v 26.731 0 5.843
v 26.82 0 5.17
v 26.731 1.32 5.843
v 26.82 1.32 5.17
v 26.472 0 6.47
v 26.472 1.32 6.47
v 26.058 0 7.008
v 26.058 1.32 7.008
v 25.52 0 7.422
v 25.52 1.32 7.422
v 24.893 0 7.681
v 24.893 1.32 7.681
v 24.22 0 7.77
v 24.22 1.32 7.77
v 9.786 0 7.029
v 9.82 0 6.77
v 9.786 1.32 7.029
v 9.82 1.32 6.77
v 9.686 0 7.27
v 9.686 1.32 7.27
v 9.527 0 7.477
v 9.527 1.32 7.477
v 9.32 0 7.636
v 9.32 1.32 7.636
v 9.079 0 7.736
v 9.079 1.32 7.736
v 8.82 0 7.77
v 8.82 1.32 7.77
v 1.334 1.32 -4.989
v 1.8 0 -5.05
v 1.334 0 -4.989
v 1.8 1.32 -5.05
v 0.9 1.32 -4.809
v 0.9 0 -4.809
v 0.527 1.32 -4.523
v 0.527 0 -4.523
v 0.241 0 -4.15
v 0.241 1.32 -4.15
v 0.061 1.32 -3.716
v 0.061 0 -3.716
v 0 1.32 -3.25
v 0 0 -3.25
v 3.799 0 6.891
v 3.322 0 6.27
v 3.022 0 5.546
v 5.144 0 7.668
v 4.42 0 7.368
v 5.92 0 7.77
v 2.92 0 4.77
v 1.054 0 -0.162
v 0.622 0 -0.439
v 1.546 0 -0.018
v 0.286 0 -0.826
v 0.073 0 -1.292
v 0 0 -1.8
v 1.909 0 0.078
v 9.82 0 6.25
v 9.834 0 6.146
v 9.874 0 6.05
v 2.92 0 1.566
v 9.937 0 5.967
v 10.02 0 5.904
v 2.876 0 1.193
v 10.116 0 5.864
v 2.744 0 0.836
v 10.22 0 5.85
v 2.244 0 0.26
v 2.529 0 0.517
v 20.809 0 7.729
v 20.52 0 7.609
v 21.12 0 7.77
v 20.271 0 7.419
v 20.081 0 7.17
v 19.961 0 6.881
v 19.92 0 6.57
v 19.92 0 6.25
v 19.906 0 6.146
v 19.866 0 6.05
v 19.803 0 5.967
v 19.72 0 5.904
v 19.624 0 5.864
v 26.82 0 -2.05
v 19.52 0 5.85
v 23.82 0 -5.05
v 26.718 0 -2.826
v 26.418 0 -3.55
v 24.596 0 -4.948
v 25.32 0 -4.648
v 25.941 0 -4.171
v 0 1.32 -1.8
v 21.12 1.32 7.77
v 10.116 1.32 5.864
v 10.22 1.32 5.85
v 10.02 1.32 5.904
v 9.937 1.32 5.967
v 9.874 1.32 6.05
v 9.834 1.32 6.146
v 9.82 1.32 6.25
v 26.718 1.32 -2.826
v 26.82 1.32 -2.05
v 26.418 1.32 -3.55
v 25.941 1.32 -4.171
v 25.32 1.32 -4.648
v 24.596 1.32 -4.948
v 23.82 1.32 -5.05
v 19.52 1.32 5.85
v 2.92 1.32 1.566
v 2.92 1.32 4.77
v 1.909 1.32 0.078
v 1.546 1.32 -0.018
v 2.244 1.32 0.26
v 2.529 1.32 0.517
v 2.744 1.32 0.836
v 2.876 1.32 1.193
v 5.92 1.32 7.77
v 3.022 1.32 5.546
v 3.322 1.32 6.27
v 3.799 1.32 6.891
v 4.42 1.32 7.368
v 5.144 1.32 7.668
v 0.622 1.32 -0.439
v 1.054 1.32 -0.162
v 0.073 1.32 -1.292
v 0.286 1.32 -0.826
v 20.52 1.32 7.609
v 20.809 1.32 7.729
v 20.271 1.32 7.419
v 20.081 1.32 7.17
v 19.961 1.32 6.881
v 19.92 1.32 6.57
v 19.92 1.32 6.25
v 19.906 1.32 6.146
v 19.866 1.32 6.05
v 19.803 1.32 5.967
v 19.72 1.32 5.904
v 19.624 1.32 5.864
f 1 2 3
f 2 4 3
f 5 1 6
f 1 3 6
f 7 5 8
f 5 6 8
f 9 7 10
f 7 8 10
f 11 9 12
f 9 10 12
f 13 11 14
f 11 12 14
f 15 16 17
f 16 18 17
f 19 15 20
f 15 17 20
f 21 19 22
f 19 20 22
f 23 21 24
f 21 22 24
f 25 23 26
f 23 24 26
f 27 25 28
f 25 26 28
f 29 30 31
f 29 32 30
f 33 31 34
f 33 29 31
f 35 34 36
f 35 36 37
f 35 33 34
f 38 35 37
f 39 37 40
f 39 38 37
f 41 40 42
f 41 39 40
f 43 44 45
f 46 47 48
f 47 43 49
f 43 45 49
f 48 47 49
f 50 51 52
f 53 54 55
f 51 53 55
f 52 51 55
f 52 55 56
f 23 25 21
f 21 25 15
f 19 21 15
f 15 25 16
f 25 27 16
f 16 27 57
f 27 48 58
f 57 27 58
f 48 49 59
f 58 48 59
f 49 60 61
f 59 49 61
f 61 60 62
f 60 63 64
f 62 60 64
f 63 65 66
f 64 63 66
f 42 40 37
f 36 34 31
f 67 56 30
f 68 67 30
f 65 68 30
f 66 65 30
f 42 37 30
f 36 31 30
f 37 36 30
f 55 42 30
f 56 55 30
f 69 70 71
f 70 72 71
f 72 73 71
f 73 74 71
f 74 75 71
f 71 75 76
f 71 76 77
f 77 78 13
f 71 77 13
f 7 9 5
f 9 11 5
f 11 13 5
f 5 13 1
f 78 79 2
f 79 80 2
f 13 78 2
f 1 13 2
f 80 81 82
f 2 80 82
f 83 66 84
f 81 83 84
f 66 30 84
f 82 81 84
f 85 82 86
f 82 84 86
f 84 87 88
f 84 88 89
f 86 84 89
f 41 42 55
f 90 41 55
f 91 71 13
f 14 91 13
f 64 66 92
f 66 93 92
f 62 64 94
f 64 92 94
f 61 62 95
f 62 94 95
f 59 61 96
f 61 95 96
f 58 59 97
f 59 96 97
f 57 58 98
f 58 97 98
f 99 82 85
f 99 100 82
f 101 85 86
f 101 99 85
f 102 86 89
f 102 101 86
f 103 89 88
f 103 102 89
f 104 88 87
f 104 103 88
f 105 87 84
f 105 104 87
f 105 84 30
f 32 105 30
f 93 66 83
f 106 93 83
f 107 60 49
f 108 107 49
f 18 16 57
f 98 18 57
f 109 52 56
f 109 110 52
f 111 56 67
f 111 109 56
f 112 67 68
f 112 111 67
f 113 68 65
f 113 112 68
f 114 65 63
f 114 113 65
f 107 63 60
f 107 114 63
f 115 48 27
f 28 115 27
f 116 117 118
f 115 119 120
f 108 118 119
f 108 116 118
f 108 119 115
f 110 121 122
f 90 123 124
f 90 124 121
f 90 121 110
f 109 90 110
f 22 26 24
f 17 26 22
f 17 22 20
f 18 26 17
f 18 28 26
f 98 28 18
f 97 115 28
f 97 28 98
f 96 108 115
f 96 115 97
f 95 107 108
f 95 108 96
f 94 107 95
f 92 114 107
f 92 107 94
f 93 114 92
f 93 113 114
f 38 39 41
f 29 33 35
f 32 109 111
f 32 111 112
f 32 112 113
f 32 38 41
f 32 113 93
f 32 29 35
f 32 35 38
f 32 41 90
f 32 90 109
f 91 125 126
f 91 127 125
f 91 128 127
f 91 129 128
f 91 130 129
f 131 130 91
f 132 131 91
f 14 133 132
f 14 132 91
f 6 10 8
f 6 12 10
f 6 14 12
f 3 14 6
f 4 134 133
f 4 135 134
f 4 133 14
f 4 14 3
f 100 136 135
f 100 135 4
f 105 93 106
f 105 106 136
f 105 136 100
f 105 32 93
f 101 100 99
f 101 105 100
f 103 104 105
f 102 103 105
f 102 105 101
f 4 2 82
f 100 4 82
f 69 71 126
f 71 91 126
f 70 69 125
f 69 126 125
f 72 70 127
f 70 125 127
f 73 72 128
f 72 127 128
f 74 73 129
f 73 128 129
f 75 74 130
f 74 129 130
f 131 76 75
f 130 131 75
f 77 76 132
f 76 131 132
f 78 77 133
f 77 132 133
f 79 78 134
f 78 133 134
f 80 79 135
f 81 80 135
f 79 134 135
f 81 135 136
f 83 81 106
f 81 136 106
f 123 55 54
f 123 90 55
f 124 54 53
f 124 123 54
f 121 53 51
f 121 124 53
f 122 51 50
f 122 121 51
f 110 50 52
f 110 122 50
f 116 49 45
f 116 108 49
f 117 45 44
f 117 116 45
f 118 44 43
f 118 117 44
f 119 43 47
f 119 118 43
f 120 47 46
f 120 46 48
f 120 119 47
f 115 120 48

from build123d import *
from OCP.BRepFilletAPI import BRepFilletAPI_MakeFillet

# Parameters (mm, degrees)
BOSS_EXTRUDE1_DEPTH = 1.32
FILLET1_R           = 3
FILLET2_R           = 2.6
FILLET3_R1          = 1.2
FILLET3_R2          = 1
FILLET4_R           = 0.4
FILLET5_R           = 1.8
FILLET6_R           = 1.6


with BuildPart() as part:
    # Sketch1 → Boss-Extrude1 (new body)
    with BuildSketch(Plane(origin=(0, 0, 0), x_dir=(1, 0, 0), z_dir=(0, 1, 0))):
        Polygon((0, 0), (2.92, 0), (2.92, -7.77), (9.82, -7.77), (9.82, -5.85), (19.92, -5.85), (19.92, -7.77), (26.82, -7.77), (26.82, 5.05), (0, 5.05), align=None)
    extrude(amount=BOSS_EXTRUDE1_DEPTH)

    # Fillet1
    fillet1_edges = [part.edges().sort_by_distance(p)[0] for p in [
        (26.82, 0.66, -5.05),
        (2.92, 0.66, 7.77),
    ]]
    fillet(fillet1_edges, radius=FILLET1_R)

    # Fillet2
    fillet2_edges = [part.edges().sort_by_distance(p)[0] for p in [
        (26.82, 0.66, 7.77),
    ]]
    fillet(fillet2_edges, radius=FILLET2_R)

    # Fillet3: one fillet with a radius per group of edges: ONE call of the kernel's fillet builder (fillet() takes one radius for all edges)
    fillet3_edges_1 = [part.edges().sort_by_distance(p)[0] for p in [
        (19.92, 0.66, 7.77),
    ]]
    fillet3_edges_2 = [part.edges().sort_by_distance(p)[0] for p in [
        (9.82, 0.66, 7.77),
    ]]
    fillet3 = BRepFilletAPI_MakeFillet(part.part.solid().wrapped)
    for e in fillet3_edges_1:
        fillet3.Add(FILLET3_R1, e.wrapped)
    for e in fillet3_edges_2:
        fillet3.Add(FILLET3_R2, e.wrapped)
    add(Compound.cast(fillet3.Shape()), mode=Mode.REPLACE)

    # Fillet4
    fillet4_edges = [part.edges().sort_by_distance(p)[0] for p in [
        (19.92, 0.66, 5.85),
        (9.82, 0.66, 5.85),
    ]]
    fillet(fillet4_edges, radius=FILLET4_R)

    # Fillet5
    fillet5_edges = [part.edges().sort_by_distance(p)[0] for p in [
        (0, 0.66, -5.05),
        (0, 0.66, 0),
    ]]
    fillet(fillet5_edges, radius=FILLET5_R)

    # Fillet6
    fillet6_edges = [part.edges().sort_by_distance(p)[0] for p in [
        (2.92, 0.66, 0),
    ]]
    fillet(fillet6_edges, radius=FILLET6_R)


solid = part.part
